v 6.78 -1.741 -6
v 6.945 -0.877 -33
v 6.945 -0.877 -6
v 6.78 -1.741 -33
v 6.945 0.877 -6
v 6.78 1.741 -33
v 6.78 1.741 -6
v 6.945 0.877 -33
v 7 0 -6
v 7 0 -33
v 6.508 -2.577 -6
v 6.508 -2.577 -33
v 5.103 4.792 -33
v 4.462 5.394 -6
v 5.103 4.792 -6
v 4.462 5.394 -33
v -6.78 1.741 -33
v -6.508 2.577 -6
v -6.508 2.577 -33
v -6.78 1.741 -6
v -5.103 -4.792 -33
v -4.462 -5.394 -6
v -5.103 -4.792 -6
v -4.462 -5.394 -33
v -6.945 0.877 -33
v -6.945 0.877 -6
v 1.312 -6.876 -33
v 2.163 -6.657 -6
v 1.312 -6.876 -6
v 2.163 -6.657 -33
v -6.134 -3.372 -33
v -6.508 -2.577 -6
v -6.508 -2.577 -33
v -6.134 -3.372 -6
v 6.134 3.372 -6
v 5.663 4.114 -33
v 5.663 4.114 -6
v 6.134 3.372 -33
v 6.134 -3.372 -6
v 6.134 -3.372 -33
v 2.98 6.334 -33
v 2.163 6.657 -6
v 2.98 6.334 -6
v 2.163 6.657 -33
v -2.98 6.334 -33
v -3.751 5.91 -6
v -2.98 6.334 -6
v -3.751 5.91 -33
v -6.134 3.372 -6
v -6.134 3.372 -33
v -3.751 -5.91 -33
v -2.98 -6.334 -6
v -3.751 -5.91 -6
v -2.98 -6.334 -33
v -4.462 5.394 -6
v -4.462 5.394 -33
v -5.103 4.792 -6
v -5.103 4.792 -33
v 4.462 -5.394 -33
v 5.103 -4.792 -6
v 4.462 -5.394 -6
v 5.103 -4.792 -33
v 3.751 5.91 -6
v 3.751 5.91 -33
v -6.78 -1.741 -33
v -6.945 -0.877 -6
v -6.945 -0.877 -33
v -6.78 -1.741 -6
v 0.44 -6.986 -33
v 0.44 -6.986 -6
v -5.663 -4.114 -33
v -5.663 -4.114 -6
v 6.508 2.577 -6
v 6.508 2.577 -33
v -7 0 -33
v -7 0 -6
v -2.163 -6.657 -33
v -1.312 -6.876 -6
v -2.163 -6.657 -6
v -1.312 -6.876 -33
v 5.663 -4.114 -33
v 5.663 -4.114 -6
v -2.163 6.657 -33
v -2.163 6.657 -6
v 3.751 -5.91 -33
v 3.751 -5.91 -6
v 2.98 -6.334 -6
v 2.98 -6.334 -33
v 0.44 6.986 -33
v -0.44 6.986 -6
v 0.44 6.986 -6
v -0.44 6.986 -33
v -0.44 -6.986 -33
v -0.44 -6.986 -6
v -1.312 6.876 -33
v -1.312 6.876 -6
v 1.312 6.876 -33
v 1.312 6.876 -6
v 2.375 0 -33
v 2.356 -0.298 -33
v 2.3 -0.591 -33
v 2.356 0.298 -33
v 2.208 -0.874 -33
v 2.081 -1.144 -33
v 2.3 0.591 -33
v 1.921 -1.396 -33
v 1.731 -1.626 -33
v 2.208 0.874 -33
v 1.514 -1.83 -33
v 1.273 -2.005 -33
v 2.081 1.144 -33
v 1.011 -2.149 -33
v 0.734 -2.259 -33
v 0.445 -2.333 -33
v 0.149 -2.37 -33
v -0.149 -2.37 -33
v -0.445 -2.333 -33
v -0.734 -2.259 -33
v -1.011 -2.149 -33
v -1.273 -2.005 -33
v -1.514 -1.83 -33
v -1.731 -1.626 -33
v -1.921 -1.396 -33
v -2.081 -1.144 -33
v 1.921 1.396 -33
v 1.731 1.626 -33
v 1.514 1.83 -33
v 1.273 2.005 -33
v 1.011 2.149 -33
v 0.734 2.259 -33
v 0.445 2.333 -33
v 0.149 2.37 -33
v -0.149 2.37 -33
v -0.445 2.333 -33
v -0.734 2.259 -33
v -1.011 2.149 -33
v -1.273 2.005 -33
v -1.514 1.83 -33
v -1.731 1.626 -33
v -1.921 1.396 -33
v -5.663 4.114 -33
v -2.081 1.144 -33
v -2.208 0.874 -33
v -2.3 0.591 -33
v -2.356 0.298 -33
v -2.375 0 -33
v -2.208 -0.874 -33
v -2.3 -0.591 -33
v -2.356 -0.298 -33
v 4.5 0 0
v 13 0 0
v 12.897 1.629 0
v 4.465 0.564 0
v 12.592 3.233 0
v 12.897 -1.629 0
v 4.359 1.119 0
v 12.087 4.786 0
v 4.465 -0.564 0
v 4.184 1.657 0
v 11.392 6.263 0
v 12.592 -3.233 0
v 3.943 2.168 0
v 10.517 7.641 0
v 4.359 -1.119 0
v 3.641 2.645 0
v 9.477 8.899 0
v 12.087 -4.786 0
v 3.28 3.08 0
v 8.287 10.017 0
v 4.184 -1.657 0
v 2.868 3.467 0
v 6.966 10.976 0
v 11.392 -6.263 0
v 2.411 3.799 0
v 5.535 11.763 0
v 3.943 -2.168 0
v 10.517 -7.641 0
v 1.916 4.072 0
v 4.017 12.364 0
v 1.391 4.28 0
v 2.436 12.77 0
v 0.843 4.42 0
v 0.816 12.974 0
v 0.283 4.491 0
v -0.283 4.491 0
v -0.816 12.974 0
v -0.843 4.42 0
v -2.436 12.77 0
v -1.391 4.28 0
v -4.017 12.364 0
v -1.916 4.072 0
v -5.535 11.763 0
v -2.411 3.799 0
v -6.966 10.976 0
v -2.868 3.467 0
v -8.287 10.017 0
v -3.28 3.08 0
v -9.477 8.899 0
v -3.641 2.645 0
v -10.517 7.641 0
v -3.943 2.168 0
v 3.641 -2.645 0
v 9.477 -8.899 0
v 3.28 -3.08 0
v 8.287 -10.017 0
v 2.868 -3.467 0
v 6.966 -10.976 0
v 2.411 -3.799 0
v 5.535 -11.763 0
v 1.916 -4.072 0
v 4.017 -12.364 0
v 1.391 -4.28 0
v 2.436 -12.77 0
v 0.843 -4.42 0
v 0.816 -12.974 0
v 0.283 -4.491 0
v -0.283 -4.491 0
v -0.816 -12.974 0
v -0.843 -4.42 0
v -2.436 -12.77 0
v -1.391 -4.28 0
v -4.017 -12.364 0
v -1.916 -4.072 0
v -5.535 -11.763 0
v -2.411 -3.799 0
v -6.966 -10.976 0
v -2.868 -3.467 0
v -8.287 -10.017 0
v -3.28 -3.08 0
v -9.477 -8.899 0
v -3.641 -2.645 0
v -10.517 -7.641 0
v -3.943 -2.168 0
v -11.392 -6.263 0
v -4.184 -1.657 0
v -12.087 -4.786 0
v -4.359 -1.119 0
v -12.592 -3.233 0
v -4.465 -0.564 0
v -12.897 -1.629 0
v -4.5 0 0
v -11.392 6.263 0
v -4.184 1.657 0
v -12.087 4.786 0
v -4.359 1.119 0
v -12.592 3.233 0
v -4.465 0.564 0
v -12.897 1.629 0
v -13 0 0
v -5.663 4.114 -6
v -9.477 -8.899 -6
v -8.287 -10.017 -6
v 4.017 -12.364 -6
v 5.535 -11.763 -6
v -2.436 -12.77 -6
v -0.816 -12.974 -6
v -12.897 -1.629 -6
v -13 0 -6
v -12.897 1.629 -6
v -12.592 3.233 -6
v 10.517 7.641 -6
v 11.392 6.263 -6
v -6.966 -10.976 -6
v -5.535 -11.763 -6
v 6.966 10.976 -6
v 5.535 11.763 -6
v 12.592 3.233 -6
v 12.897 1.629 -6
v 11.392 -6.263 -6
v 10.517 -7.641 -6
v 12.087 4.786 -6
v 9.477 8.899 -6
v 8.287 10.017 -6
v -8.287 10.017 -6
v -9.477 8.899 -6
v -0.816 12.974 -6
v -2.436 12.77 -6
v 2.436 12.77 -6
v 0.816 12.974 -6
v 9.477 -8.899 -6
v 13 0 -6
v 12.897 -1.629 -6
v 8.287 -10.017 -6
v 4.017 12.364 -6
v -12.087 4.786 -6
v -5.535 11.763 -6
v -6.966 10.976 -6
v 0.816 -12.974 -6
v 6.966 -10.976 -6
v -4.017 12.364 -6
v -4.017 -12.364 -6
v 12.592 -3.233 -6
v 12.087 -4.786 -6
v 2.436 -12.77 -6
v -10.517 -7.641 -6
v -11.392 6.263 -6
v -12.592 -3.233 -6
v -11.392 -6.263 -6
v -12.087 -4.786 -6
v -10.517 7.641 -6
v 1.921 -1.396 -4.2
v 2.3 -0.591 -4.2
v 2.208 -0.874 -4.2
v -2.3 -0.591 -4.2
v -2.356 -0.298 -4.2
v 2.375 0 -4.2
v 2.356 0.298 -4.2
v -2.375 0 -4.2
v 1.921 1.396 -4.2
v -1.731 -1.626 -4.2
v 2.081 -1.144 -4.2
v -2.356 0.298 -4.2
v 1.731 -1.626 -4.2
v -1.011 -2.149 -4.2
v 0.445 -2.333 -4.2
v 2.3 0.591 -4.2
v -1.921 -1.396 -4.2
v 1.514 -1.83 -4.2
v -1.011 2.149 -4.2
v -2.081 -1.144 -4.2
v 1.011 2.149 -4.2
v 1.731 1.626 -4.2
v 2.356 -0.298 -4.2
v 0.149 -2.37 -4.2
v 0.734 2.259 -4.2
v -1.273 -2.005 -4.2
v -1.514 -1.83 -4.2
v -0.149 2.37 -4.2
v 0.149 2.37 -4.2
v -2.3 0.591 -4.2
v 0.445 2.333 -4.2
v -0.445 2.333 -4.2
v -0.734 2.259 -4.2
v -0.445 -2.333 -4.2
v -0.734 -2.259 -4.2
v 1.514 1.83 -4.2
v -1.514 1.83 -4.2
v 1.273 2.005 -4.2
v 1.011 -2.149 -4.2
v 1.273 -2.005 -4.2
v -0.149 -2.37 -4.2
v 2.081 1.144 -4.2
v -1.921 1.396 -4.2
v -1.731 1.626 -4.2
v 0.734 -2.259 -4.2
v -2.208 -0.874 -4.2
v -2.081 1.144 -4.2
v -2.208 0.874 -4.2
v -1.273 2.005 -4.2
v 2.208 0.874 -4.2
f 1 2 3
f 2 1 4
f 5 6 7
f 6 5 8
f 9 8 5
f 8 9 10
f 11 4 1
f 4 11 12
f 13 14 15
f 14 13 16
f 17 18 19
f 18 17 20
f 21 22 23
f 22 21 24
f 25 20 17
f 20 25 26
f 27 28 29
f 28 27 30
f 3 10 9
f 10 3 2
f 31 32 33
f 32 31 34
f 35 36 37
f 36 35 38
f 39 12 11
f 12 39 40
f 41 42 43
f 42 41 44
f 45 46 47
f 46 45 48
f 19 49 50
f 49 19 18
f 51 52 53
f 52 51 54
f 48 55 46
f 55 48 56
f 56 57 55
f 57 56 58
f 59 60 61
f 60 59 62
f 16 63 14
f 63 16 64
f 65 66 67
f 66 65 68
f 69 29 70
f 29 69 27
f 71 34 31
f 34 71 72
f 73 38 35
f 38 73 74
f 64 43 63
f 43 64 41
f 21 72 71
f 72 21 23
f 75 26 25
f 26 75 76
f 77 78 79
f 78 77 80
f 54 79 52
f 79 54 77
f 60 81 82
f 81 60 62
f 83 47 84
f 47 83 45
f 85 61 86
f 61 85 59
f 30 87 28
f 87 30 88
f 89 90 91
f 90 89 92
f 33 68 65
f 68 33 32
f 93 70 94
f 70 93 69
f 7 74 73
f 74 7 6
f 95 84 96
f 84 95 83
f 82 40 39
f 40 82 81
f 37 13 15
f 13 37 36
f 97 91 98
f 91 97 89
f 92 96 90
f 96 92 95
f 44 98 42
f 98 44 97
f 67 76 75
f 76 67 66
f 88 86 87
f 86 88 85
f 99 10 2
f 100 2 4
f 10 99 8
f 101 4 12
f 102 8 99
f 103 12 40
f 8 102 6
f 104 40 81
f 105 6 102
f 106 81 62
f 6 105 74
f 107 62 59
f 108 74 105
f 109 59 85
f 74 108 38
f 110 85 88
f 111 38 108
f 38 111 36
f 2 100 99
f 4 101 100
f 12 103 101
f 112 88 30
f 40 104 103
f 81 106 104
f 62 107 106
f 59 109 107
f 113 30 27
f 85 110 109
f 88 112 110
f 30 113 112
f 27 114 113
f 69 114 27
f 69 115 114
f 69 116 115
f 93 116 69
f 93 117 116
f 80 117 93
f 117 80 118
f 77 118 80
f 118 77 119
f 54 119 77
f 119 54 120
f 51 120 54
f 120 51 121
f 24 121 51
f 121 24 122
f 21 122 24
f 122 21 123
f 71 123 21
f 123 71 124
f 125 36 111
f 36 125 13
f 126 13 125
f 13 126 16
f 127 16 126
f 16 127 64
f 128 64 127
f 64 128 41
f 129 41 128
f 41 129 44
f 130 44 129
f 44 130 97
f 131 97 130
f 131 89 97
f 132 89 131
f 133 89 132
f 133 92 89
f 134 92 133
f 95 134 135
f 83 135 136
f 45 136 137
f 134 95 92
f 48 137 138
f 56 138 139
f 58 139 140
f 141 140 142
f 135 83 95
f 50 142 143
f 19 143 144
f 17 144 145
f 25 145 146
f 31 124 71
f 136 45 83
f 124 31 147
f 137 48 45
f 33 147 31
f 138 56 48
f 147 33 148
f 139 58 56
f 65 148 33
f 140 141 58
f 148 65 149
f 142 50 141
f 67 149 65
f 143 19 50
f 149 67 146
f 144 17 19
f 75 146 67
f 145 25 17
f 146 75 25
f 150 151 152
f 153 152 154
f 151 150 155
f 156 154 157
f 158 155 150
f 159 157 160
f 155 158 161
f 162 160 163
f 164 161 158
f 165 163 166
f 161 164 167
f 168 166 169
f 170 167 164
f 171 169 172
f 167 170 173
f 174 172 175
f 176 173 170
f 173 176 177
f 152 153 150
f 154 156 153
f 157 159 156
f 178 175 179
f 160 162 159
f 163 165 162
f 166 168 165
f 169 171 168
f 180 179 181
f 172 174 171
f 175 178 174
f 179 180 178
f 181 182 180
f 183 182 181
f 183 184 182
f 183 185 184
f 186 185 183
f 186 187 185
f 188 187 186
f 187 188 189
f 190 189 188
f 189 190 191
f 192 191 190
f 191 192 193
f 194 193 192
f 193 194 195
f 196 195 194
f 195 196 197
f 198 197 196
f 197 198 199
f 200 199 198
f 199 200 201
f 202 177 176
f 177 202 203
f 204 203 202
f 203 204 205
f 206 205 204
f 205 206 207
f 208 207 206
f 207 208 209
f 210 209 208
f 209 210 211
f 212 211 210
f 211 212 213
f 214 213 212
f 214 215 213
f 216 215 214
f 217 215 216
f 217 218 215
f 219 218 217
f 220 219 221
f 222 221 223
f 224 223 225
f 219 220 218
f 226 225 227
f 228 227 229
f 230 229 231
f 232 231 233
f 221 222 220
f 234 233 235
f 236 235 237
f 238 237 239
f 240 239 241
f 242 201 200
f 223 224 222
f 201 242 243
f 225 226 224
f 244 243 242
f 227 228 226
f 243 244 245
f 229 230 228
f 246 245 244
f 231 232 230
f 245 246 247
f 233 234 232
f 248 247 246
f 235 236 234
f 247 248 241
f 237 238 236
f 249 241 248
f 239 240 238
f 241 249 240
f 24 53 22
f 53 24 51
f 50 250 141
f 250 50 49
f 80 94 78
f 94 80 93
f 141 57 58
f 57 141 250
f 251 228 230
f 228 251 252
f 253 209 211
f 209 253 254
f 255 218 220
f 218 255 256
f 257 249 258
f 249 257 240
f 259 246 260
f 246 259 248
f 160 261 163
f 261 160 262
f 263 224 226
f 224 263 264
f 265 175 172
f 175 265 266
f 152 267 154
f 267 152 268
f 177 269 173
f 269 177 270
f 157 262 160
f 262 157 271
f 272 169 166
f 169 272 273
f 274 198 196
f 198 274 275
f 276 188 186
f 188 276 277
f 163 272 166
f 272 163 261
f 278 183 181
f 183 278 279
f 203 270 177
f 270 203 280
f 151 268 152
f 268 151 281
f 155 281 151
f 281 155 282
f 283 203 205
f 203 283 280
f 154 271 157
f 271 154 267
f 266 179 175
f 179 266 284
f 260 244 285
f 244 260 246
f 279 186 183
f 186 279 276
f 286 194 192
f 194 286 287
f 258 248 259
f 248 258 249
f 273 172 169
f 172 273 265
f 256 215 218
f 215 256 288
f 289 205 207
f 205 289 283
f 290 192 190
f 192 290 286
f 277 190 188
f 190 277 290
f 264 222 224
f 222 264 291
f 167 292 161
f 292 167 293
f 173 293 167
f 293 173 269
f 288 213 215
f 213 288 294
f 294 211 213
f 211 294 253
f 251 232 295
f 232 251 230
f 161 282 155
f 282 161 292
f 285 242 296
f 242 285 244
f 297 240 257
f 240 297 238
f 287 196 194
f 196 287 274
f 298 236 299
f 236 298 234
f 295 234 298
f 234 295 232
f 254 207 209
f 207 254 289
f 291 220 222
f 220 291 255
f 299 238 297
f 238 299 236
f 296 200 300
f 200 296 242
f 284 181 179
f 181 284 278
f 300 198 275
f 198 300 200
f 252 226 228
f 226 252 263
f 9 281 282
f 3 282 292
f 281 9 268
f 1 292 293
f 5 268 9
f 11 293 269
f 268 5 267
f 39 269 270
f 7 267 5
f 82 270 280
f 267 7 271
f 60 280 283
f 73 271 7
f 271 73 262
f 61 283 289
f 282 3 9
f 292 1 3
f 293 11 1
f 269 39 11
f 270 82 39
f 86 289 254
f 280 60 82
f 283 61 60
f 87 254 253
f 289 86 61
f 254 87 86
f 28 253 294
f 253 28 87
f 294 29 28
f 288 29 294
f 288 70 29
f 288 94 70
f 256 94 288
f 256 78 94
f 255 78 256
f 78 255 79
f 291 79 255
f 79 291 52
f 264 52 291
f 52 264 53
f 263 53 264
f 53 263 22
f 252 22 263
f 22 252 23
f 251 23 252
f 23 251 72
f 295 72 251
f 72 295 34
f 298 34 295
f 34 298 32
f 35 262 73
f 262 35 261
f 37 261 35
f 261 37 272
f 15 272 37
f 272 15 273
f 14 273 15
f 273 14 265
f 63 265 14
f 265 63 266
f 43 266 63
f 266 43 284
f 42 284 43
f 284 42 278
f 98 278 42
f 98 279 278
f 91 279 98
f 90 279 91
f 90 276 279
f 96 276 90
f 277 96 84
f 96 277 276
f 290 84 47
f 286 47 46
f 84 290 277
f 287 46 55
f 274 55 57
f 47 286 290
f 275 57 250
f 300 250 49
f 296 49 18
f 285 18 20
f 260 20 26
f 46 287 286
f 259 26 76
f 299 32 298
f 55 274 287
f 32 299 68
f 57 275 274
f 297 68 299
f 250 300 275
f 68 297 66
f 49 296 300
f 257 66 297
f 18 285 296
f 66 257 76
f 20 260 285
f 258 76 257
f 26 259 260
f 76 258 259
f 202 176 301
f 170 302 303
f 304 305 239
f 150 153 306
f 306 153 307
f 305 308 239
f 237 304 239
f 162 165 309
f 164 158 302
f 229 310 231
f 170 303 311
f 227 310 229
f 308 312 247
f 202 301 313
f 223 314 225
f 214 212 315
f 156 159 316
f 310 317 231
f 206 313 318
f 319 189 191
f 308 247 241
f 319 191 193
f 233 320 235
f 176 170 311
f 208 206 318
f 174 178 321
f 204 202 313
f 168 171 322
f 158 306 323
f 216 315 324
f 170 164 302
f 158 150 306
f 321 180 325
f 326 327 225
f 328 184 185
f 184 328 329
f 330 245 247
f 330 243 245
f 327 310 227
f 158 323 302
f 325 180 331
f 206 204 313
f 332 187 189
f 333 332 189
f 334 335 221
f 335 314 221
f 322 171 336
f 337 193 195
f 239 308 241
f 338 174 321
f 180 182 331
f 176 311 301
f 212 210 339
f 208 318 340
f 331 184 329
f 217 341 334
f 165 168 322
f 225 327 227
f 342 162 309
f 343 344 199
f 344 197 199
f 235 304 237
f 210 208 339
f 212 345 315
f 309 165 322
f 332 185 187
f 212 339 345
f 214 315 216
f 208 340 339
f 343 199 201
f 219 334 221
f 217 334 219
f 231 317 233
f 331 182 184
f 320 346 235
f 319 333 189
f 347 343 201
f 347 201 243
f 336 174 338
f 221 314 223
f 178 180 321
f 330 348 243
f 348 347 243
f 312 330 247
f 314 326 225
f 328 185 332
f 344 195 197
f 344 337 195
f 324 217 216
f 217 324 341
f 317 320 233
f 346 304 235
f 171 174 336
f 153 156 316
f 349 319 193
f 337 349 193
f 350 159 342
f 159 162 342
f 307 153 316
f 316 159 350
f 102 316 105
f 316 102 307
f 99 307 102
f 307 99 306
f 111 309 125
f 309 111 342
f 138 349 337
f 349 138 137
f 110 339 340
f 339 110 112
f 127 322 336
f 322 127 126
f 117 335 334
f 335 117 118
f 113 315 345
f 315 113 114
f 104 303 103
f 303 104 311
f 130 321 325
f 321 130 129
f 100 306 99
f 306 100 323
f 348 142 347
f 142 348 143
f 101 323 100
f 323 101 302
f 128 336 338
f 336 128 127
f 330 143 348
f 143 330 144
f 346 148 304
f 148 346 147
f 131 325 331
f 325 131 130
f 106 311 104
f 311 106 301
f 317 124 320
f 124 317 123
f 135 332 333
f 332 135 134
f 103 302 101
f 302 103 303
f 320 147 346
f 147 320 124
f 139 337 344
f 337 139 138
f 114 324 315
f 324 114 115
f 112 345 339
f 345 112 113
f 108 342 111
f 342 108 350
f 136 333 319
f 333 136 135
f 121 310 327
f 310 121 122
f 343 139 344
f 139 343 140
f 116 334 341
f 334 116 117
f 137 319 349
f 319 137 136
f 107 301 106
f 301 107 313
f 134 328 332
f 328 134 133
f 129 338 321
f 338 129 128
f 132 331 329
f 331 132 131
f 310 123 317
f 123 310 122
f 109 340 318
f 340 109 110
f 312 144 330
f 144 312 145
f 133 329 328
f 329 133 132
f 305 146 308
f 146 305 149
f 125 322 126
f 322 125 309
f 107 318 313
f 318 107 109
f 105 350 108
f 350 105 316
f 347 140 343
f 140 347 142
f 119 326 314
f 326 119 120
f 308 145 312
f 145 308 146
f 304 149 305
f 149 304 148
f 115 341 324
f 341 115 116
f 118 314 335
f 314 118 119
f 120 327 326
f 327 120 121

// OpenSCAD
$fn = 50;


difference() {
	union() {
		translate(v = [0, 0, -33.0000000000]) {
			cylinder(h = 33, r = 7.0000000000);
		}
		translate(v = [0, 0, -6.0000000000]) {
			cylinder(h = 6, r = 13.0000000000);
		}
	}
	union() {
		translate(v = [0, 0, 0]) {
			rotate(a = [0, 0, 0]) {
				difference() {
					union() {
						#translate(v = [0, 0, -33.0000000000]) {
							cylinder(h = 33, r = 2.2500000000);
						}
						#translate(v = [0, 0, -4.2000000000]) {
							cylinder(h = 4.2000000000, r1 = 2.3750000000, r2 = 4.5000000000);
						}
						#translate(v = [0, 0, -33.0000000000]) {
							cylinder(h = 33, r = 2.3750000000);
						}
						#translate(v = [0, 0, -33.0000000000]) {
							cylinder(h = 33, r = 2.2500000000);
						}
					}
					union();
				}
			}
		}
	}
}
